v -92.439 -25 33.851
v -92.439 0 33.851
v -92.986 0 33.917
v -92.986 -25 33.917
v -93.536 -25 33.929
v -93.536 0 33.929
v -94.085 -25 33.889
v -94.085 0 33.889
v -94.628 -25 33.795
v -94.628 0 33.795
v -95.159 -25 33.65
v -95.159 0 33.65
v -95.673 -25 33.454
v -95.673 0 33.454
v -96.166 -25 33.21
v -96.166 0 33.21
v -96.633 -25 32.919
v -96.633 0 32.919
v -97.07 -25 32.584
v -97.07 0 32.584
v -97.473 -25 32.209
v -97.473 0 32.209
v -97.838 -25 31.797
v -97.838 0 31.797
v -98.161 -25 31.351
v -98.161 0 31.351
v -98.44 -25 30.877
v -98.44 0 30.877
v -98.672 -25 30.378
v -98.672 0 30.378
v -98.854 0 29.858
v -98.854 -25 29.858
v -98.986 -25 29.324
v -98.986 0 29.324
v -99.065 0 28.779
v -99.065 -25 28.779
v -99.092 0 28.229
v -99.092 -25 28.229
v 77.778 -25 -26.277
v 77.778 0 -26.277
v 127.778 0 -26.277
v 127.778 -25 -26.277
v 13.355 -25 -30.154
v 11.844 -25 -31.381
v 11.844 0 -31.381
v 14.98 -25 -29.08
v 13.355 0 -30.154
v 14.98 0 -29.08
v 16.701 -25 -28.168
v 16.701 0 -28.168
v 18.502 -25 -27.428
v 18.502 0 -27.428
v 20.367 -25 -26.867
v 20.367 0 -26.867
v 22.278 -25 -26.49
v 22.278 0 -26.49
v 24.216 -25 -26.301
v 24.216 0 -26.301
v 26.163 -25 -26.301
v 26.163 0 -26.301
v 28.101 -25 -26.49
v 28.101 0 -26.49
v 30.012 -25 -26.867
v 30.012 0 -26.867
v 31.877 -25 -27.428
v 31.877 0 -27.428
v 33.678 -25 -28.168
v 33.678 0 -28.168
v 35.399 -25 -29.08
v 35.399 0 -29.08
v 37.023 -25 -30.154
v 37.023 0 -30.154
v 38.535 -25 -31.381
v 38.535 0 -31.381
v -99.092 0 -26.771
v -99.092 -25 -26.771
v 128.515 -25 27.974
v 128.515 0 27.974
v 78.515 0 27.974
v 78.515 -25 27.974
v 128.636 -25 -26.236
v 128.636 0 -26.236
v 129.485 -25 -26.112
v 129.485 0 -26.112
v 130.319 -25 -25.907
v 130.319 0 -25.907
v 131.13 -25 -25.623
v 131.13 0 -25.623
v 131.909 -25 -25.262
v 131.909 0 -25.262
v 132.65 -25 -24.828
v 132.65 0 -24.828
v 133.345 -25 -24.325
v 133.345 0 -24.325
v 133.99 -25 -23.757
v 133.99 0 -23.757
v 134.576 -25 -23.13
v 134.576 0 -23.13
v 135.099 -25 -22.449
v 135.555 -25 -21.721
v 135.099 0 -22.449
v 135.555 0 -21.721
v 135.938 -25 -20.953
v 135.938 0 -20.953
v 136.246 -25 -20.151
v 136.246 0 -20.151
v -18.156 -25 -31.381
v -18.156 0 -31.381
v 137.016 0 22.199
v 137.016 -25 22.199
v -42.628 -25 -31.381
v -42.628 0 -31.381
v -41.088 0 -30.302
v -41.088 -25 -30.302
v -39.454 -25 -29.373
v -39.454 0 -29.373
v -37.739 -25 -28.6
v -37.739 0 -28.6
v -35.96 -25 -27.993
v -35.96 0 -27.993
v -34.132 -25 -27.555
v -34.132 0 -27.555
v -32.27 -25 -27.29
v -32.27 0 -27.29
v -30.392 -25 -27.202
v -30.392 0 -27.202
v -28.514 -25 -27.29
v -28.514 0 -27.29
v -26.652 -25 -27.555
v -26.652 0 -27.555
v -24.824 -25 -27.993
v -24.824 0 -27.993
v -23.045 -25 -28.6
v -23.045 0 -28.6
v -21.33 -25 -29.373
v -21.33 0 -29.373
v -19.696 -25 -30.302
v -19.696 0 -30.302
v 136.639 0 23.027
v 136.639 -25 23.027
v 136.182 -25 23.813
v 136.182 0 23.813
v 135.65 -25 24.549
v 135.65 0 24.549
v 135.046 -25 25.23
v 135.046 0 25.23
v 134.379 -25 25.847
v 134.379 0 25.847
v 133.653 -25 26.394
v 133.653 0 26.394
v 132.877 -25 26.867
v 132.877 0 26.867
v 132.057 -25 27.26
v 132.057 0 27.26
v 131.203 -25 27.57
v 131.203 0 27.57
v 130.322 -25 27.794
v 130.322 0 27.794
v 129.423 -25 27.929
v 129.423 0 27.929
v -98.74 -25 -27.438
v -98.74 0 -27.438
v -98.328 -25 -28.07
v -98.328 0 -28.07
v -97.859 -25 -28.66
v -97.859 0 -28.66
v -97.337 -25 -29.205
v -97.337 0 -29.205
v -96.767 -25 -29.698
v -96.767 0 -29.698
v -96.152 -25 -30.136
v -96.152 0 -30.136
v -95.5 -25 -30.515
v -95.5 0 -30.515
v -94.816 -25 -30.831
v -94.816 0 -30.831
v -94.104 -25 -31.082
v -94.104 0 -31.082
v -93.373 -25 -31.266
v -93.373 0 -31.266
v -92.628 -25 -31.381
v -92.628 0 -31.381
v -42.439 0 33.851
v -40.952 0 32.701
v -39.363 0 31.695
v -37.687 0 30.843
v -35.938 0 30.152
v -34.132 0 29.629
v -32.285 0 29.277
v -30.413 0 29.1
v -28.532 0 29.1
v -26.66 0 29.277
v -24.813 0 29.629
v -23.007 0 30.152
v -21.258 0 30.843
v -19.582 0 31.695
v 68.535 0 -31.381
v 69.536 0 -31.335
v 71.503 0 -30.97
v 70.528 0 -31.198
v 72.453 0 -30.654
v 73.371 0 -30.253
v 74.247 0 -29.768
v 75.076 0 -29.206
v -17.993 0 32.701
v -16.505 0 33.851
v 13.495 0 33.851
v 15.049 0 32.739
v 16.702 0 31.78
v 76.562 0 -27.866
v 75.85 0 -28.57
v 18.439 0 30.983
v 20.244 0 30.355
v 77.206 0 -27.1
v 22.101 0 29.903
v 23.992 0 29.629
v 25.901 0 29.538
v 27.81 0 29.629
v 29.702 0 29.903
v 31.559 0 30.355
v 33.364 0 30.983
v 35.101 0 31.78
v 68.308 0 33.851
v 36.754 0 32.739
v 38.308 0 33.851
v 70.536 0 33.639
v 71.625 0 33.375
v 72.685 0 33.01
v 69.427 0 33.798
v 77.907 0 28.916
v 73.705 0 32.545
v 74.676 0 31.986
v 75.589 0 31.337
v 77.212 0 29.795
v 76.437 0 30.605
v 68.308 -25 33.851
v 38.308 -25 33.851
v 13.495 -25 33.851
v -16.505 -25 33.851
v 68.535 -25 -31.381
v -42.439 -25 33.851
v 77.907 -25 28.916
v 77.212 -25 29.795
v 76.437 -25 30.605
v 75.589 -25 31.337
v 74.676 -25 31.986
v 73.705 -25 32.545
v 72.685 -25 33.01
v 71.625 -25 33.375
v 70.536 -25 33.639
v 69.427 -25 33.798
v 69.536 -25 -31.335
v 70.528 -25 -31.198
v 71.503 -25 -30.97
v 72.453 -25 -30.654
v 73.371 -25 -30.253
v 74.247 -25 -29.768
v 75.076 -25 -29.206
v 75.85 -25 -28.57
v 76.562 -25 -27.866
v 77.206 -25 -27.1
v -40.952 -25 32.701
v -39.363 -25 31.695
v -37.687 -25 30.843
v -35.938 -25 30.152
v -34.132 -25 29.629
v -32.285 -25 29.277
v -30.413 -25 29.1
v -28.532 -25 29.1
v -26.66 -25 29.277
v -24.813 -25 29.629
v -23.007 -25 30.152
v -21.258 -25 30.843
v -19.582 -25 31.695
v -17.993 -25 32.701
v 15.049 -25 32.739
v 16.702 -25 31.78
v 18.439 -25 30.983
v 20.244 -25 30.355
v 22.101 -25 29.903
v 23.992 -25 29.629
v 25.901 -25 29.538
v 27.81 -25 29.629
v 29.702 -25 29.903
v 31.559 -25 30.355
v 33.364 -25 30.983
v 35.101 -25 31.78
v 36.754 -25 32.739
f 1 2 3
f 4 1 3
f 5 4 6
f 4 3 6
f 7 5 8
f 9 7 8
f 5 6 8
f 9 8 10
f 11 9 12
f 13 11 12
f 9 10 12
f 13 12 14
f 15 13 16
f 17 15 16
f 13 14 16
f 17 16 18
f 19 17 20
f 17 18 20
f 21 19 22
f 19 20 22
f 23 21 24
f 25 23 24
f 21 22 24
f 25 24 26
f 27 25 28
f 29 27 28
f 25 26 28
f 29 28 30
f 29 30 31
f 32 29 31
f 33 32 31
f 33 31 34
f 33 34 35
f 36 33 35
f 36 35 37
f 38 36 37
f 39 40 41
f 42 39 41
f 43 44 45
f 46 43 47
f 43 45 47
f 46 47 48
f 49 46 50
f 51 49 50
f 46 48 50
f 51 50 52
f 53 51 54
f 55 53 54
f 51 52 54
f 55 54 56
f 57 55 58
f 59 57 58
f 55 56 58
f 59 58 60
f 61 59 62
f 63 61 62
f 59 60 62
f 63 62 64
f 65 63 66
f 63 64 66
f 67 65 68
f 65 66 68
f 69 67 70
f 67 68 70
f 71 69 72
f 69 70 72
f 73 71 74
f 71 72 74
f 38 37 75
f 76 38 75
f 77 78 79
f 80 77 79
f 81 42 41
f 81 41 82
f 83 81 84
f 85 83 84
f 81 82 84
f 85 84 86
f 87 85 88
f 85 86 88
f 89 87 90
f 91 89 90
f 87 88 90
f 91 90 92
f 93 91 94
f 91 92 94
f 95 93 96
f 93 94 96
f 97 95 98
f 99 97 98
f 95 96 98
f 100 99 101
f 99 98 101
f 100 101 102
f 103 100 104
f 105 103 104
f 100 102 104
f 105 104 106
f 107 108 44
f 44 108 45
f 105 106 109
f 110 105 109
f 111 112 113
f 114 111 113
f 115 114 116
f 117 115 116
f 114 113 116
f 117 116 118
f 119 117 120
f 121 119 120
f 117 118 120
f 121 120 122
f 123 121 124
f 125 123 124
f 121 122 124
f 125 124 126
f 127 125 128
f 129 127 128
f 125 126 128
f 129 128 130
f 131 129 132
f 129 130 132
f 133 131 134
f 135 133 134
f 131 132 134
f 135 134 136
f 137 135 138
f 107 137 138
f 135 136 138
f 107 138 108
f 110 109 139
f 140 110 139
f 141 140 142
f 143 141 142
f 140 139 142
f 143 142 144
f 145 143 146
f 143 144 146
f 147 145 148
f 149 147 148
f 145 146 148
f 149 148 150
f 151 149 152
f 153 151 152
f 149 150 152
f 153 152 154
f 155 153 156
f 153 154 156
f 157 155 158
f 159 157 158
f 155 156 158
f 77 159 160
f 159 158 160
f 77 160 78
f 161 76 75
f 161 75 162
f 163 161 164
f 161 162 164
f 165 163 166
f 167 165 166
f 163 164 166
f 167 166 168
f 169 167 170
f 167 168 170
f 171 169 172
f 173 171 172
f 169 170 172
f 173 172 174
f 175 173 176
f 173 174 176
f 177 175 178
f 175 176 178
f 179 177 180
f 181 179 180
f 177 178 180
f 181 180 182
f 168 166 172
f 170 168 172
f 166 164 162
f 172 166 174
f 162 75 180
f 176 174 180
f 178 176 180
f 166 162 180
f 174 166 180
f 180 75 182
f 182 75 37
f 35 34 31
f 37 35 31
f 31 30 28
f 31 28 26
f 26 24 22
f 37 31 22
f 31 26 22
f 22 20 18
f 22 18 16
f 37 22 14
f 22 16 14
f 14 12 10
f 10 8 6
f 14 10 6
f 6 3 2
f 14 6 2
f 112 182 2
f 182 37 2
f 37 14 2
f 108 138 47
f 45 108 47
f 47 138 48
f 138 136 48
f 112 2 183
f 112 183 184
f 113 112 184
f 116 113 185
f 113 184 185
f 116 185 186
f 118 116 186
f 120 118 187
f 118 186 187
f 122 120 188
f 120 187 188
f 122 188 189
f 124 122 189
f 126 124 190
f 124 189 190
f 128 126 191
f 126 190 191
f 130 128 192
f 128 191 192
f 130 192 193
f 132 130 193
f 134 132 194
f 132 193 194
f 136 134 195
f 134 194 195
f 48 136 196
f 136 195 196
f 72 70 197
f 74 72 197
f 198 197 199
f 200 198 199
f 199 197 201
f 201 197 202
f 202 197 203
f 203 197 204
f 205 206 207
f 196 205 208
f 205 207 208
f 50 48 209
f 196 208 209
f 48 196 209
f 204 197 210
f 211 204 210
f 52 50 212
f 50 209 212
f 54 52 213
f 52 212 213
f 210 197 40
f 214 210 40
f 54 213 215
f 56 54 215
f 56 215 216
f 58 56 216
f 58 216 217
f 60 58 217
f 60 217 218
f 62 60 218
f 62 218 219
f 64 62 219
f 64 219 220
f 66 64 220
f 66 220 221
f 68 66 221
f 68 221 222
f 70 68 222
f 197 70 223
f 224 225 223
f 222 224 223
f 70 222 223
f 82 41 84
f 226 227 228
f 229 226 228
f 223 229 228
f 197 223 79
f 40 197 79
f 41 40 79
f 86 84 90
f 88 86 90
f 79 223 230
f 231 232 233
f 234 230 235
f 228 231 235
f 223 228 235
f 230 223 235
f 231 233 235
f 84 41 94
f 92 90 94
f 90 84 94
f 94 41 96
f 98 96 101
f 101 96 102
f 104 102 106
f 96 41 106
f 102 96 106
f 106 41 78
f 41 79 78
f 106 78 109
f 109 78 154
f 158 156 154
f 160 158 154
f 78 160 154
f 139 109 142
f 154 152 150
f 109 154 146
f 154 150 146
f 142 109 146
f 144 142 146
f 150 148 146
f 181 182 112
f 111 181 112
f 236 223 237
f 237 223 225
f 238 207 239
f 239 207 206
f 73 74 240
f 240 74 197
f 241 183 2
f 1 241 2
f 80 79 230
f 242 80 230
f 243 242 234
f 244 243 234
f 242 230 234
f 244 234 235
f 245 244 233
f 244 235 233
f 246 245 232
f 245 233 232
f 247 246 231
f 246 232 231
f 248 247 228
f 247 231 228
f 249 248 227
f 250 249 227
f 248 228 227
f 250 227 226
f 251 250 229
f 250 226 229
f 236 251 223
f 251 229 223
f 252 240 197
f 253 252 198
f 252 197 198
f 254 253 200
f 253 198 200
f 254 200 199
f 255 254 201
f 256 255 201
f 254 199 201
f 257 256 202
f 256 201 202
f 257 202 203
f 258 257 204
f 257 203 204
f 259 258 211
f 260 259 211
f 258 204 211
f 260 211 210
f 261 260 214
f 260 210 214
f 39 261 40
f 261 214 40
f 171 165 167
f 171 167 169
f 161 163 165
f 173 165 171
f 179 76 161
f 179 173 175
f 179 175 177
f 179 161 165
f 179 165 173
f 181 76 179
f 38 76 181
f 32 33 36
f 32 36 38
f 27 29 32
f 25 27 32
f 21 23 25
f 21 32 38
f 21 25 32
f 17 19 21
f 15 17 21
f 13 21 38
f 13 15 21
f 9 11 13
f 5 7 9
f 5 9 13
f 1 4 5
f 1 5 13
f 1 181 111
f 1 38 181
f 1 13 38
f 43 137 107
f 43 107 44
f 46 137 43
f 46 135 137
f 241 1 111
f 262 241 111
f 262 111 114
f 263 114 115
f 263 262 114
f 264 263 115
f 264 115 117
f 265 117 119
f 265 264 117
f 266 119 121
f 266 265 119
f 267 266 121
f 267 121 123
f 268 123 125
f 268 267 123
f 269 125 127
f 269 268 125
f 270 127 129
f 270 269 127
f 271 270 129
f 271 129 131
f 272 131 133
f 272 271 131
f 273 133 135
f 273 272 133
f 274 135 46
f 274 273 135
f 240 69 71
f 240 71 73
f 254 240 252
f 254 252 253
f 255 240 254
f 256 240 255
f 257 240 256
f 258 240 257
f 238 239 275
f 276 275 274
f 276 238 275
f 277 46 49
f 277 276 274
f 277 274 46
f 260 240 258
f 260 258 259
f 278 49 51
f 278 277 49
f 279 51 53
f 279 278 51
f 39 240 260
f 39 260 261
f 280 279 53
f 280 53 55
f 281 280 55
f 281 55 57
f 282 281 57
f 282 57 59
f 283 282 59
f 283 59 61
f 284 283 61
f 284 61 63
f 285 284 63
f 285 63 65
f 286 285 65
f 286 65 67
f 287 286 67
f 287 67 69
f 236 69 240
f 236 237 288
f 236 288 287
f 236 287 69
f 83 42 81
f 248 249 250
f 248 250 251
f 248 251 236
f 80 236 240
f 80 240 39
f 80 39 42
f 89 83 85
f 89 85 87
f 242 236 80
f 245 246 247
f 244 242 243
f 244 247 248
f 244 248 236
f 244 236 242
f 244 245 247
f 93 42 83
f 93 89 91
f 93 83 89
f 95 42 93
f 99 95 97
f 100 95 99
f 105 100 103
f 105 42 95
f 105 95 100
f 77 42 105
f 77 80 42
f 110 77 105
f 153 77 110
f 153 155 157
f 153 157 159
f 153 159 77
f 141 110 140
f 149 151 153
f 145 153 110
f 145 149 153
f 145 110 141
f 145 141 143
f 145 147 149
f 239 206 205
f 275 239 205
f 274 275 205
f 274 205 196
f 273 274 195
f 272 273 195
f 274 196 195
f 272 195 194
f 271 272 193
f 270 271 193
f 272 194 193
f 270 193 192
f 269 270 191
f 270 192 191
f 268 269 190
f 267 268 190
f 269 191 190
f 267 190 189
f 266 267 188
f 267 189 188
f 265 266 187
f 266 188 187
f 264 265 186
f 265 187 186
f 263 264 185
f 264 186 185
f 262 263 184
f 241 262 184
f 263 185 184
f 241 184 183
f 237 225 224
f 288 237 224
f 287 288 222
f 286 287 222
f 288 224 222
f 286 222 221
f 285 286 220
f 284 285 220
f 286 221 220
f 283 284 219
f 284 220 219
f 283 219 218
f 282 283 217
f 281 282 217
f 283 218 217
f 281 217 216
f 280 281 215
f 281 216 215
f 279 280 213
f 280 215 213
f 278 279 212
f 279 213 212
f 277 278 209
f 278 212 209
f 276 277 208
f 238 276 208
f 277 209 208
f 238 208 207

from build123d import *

# Parameters (mm, degrees)
F1_DEPTH = 25


with BuildPart() as f1:
    # F0 (on Front) → F1 (new body)
    with BuildSketch(Plane.XZ):
        with BuildLine():
            ThreePointArc((-92.43948, 33.851352), (-97.070489, 32.584286), (-99.091926, 28.229347))
            Line((-99.091926, 28.229347), (-99.091926, -26.770653))
            ThreePointArc((-99.091926, -26.770653), (-96.464596, -29.92403), (-92.627565, -31.381369))
            Line((-92.627565, -31.381369), (-42.627565, -31.381369))
            ThreePointArc((-42.627565, -31.381369), (-30.392022, -27.201973), (-18.15648, -31.381369))
            Line((-18.15648, -31.381369), (11.84352, -31.381369))
            ThreePointArc((11.84352, -31.381369), (25.189403, -26.277255), (38.535287, -31.381369))
            Line((38.535287, -31.381369), (68.535287, -31.381369))
            ThreePointArc((68.535287, -31.381369), (73.814491, -30.020555), (77.778015, -26.277255))
            Line((77.778015, -26.277255), (127.778015, -26.277255))
            ThreePointArc((127.778015, -26.277255), (133.003671, -24.585093), (136.245534, -20.150995))
            Line((136.245534, -20.150995), (137.015536, 22.199387))
            ThreePointArc((137.015536, 22.199387), (133.653161, 26.394115), (128.514688, 27.974436))
            Line((128.514688, 27.974436), (78.514688, 27.974436))
            ThreePointArc((78.514688, 27.974436), (74.196713, 32.277135), (68.307743, 33.851352))
            Line((68.307743, 33.851352), (38.307743, 33.851352))
            ThreePointArc((38.307743, 33.851352), (25.901161, 29.538185), (13.49458, 33.851352))
            Line((13.49458, 33.851352), (-16.50542, 33.851352))
            ThreePointArc((-16.50542, 33.851352), (-29.47245, 29.078174), (-42.43948, 33.851352))
            Line((-42.43948, 33.851352), (-92.43948, 33.851352))
        make_face()
    extrude(amount=F1_DEPTH)


solid = f1.part
